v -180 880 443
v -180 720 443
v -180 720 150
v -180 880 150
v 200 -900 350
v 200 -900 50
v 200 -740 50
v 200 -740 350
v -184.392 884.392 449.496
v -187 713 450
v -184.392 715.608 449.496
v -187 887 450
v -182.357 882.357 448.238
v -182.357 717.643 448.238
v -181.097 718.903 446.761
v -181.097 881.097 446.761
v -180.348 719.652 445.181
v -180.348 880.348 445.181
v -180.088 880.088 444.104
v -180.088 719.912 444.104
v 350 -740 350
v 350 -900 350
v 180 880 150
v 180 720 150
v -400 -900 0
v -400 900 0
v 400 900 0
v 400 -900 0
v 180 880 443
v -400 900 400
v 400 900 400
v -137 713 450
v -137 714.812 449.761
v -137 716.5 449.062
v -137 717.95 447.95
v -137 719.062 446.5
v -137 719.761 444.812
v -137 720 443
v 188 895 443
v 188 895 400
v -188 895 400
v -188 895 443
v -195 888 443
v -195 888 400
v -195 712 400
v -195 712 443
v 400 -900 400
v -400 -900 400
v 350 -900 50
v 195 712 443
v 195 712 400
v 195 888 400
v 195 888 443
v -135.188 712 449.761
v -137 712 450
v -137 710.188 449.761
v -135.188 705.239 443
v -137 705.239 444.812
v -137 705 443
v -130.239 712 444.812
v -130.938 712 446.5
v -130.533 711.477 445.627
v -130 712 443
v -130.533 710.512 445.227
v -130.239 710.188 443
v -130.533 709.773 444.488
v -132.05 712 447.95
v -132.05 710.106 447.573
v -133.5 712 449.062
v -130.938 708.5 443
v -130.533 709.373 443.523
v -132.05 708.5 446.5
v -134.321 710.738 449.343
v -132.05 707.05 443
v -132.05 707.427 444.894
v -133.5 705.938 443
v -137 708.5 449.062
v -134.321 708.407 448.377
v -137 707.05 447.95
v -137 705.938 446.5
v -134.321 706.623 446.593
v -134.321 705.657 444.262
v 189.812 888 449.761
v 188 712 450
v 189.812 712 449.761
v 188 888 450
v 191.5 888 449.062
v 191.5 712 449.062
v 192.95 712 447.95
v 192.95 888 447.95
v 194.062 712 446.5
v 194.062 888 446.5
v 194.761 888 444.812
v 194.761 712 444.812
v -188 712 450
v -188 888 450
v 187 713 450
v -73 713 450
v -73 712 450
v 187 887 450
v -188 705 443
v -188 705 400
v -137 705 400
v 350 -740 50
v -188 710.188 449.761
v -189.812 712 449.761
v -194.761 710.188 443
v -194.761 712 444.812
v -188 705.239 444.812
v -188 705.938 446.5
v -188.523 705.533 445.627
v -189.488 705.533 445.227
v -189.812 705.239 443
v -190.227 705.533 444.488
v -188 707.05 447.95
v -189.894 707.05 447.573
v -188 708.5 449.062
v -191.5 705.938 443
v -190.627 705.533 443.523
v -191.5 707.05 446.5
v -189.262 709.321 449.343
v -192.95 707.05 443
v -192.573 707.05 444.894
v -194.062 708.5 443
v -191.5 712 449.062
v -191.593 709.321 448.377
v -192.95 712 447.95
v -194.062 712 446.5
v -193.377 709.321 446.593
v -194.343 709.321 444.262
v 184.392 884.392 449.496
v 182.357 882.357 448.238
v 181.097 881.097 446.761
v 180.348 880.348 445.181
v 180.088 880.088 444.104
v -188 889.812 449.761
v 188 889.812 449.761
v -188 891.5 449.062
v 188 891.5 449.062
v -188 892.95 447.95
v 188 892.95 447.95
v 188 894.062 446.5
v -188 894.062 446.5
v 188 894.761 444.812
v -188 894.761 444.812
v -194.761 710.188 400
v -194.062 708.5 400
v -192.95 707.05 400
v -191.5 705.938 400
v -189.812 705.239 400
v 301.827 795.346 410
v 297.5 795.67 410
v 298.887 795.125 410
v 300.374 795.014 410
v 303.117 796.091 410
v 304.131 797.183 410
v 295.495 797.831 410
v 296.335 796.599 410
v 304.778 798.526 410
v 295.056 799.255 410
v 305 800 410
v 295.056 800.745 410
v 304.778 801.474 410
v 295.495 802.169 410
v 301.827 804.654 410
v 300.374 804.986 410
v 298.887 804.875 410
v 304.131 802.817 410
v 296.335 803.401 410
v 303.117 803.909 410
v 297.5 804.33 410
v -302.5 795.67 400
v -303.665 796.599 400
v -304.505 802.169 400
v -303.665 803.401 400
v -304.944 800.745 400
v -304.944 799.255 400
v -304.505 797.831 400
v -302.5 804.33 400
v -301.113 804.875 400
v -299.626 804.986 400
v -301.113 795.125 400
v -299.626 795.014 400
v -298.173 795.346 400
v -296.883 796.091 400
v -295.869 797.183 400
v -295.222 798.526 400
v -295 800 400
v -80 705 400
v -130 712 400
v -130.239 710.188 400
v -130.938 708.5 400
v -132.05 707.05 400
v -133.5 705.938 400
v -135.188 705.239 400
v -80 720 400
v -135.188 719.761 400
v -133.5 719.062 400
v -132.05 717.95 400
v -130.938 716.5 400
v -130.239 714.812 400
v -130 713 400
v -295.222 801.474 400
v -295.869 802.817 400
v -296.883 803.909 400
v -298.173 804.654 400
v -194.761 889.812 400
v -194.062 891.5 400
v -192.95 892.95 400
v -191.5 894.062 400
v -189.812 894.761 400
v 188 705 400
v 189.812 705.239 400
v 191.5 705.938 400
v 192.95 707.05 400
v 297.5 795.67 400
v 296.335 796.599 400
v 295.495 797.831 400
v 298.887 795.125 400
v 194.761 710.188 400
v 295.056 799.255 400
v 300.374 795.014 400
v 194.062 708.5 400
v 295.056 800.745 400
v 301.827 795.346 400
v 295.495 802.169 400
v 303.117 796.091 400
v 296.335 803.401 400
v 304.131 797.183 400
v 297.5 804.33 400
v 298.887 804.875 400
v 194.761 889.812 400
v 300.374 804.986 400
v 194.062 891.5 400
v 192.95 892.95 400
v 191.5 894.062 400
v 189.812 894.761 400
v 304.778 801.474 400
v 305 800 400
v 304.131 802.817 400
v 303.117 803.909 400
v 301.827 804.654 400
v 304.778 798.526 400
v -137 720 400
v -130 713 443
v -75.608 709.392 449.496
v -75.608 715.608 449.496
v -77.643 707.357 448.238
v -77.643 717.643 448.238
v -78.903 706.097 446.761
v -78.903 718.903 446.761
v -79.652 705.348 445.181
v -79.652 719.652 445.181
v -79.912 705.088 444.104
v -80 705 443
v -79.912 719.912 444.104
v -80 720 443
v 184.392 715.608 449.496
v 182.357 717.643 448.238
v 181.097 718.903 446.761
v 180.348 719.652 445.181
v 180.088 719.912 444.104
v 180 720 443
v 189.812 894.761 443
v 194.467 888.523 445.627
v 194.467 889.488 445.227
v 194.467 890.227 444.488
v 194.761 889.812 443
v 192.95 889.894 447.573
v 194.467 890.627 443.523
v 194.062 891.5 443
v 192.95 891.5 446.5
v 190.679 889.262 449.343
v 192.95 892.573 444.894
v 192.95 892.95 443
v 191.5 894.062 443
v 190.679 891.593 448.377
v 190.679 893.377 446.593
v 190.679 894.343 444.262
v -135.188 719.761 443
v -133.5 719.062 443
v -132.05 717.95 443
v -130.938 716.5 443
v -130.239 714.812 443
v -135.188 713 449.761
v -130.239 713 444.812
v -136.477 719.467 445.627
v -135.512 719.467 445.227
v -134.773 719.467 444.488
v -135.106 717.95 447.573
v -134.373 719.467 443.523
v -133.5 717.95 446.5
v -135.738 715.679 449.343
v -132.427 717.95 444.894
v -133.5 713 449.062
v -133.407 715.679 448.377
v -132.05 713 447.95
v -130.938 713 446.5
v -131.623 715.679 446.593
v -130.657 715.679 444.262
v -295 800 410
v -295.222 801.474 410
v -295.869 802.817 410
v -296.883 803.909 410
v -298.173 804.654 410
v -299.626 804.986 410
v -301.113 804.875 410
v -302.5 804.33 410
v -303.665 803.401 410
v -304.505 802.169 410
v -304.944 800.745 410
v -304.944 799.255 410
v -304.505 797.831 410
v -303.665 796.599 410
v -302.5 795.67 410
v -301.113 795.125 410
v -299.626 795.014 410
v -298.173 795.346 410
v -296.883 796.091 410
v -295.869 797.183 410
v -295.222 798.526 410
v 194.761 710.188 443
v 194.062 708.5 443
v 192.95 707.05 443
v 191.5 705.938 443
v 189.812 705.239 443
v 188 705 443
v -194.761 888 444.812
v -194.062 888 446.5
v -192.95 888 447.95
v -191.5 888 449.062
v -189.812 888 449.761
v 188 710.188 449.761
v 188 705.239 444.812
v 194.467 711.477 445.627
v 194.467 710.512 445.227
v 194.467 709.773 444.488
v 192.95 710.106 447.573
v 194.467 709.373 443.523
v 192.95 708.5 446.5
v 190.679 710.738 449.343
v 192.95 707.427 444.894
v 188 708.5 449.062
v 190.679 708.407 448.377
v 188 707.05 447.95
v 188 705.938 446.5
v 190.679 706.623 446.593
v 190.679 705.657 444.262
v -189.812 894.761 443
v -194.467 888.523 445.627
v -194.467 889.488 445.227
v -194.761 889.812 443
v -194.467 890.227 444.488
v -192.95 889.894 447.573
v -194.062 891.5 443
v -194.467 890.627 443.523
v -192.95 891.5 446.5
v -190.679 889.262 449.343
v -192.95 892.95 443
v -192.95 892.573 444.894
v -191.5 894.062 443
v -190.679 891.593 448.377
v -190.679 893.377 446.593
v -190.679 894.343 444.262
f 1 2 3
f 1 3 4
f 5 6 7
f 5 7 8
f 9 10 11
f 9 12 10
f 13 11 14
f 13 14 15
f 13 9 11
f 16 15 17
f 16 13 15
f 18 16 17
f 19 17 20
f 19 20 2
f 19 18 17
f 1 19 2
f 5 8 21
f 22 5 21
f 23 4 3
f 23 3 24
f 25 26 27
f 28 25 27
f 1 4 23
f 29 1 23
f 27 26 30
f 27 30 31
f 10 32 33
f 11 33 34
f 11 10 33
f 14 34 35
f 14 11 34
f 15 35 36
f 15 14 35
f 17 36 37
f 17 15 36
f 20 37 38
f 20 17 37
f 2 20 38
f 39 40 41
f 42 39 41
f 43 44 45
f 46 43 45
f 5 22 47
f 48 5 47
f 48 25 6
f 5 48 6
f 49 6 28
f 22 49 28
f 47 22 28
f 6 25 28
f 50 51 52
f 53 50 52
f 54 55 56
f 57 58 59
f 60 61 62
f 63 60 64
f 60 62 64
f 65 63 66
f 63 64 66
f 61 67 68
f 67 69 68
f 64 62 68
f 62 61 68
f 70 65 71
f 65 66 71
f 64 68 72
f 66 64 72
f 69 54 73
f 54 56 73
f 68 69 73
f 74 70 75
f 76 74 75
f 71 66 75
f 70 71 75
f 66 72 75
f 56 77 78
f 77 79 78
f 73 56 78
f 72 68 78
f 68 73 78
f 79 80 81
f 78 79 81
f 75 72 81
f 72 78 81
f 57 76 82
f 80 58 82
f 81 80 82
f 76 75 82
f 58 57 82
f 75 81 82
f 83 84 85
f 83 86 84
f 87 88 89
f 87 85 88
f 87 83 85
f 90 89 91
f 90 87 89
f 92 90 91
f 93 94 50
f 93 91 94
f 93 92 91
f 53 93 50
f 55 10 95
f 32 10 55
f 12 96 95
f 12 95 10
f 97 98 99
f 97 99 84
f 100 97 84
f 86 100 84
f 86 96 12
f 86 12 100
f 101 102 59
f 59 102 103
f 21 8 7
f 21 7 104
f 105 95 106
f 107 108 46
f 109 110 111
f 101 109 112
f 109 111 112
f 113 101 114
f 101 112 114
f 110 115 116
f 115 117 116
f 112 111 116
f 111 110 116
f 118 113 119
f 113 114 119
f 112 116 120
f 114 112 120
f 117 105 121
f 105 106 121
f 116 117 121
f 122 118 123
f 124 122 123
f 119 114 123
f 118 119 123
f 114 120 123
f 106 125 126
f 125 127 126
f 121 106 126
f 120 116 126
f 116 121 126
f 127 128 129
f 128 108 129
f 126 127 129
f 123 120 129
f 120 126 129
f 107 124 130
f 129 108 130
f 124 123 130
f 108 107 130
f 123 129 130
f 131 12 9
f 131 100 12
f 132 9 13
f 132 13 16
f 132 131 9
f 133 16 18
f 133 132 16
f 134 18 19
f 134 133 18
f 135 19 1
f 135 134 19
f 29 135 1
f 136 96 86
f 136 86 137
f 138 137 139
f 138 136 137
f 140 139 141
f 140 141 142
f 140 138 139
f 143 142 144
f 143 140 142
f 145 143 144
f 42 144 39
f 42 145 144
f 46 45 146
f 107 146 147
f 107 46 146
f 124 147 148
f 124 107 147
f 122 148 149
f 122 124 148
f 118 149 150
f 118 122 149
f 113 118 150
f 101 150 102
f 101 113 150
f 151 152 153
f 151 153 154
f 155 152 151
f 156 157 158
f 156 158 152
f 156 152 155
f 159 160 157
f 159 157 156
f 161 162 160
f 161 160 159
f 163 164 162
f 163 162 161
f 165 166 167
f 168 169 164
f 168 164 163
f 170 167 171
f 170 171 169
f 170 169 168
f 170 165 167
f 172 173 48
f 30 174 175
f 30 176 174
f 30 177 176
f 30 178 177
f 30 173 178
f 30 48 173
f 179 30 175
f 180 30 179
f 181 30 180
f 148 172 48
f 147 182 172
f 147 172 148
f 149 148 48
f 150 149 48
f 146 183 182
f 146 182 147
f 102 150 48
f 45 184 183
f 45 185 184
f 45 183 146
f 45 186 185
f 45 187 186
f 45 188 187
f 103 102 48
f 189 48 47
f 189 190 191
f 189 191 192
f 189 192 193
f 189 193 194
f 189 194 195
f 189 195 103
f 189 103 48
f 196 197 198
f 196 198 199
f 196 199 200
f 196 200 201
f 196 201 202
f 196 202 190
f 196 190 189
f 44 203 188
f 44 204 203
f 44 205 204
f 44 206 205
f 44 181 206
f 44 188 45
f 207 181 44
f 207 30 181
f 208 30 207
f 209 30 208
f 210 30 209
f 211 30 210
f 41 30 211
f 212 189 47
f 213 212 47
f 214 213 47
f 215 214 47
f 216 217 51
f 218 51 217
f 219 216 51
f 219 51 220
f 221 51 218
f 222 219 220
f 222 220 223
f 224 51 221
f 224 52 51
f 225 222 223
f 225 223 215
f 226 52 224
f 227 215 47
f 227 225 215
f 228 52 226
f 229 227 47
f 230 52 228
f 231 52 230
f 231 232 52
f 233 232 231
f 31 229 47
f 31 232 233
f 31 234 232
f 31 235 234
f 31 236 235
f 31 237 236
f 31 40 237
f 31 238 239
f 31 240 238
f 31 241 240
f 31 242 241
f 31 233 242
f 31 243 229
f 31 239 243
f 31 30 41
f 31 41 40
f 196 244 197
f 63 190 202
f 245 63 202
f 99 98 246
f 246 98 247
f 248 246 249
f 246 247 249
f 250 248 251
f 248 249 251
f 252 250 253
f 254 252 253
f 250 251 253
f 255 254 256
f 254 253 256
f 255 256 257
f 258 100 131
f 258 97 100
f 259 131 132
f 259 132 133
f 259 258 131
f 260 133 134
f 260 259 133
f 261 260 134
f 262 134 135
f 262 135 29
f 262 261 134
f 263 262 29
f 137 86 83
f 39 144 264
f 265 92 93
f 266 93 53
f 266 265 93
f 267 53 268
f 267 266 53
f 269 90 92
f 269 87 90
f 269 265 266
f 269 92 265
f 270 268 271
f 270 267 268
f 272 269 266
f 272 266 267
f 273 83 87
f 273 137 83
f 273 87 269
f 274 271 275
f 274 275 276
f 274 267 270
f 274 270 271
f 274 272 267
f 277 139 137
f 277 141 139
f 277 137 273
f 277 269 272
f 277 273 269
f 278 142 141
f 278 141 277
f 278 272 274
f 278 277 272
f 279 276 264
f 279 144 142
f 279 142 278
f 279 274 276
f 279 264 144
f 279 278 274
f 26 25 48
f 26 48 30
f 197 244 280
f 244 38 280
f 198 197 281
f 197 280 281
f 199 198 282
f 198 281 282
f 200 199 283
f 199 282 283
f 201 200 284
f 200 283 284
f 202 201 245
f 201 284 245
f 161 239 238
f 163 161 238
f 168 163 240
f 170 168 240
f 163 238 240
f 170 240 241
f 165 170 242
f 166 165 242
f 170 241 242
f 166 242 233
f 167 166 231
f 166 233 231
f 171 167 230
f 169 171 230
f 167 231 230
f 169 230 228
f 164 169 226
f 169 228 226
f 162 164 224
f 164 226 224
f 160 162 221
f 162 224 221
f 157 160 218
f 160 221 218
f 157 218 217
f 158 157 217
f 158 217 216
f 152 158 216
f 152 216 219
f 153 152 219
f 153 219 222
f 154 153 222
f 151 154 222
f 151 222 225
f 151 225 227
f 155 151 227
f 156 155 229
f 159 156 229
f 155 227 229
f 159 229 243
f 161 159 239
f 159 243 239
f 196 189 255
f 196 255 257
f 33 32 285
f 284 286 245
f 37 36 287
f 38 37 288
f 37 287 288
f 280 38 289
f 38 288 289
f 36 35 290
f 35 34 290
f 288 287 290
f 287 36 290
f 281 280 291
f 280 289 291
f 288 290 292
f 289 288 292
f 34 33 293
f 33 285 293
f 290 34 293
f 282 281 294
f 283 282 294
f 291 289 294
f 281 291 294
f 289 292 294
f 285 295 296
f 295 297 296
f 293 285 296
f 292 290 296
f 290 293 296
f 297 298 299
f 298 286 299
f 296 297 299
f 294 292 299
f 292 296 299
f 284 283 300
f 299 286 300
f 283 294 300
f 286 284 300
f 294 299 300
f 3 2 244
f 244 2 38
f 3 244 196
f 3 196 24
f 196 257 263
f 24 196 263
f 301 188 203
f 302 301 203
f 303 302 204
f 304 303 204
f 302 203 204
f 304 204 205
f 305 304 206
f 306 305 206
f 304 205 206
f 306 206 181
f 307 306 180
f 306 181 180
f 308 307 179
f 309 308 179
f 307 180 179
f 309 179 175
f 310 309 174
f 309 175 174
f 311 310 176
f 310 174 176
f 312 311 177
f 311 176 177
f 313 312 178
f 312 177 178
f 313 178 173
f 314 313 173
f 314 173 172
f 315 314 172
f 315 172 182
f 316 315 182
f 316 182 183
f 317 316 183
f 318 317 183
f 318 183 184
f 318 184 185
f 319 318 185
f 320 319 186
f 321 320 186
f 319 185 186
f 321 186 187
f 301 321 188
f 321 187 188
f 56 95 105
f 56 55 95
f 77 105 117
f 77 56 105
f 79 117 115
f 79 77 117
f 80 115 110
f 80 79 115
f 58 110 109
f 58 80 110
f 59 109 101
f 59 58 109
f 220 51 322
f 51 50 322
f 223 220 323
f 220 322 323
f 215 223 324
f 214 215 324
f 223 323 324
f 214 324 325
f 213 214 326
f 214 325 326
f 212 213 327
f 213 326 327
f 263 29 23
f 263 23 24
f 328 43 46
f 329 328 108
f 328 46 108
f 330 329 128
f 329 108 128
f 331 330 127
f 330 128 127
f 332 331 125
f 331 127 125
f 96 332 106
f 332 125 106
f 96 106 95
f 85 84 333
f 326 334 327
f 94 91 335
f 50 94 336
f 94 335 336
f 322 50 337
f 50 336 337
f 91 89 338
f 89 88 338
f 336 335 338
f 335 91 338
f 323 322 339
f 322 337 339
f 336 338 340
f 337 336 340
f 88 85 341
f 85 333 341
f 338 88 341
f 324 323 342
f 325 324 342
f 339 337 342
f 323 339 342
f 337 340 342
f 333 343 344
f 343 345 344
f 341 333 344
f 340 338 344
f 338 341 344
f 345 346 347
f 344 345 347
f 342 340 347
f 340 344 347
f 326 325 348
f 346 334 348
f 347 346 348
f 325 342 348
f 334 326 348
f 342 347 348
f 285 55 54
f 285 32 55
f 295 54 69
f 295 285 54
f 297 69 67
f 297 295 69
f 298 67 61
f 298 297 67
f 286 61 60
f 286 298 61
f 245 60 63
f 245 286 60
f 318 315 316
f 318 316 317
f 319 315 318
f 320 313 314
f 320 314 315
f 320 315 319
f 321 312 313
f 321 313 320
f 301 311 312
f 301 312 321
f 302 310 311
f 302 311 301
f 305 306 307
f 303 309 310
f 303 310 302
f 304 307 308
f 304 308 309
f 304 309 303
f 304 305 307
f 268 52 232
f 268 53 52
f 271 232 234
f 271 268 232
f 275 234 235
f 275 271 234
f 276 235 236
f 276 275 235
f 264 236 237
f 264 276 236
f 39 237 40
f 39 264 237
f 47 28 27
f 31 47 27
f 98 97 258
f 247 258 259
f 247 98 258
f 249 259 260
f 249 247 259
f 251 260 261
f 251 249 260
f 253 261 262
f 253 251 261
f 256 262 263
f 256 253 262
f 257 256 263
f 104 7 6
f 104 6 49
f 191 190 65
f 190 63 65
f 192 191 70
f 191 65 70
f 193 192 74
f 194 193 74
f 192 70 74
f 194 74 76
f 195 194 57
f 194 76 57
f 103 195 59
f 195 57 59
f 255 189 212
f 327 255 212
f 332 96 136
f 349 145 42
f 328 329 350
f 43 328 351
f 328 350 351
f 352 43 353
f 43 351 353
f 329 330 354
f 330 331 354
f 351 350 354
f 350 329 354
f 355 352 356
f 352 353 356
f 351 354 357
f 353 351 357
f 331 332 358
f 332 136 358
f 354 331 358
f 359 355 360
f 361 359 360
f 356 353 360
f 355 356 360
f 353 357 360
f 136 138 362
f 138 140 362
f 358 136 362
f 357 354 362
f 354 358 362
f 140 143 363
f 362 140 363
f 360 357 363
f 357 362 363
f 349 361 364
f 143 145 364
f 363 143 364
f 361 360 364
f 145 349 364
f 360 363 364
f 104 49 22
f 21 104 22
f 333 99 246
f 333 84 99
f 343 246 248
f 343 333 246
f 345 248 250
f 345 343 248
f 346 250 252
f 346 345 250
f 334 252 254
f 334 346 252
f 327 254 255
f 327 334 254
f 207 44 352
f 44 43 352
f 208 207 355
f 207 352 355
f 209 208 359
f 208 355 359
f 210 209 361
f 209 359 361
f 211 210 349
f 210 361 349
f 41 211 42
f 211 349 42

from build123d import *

# Parameters (mm, degrees)
F0_W     = 800
F0_H     = 1800
F1_DEPTH = 400
F2_W     = 180
F2_H     = 160
F3_DEPTH = 250
F2_W_2   = 80
F2_H_2   = 15
F4_DEPTH = 50
F5_R     = 7
F2_R     = 5
F6_DEPTH = 10
F7_W     = 150
F7_H     = 300
F8_DEPTH = 160


with BuildPart() as f1:
    # F0 (on Top) → F1 (new body)
    with BuildSketch(Plane.XY):
        Rectangle(F0_W, F0_H)
    extrude(amount=F1_DEPTH)

    # F2 (on face) → F3 (cut)
    with BuildSketch(Plane.XY.offset(400)):
        Polygon((0, 720), (0, 880), (-180, 880), (-180, 720), (-130, 720), (-80, 720), align=None)
        with Locations((90, 800)):
            Rectangle(F2_W, F2_H)
    extrude(amount=-F3_DEPTH, mode=Mode.SUBTRACT)

    # F2 (on face) → F4 (join)
    with BuildSketch(Plane.XY.offset(400)):
        Polygon((0, 880), (0, 895), (-195, 895), (-195, 705), (-130, 705), (-130, 720), (-180, 720), (-180, 880), align=None)
        Polygon((195, 895), (0, 895), (0, 880), (180, 880), (180, 720), (0, 720), (0, 705), (195, 705), align=None)
        with Locations((-40, 712.5)):
            Rectangle(F2_W_2, F2_H_2)
    extrude(amount=F4_DEPTH)

    # F5
    f5_edges = [f1.edges().sort_by_distance(p)[0] for p in [
        (0, 895, 450),
        (-195, 800, 450),
        (-162.5, 705, 450),
        (-130, 712.5, 450),
        (-155, 720, 450),
        (-180, 800, 450),
        (0, 880, 450),
        (180, 800, 450),
        (50, 720, 450),
        (-80, 712.5, 450),
        (57.5, 705, 450),
        (195, 800, 450),
        (-130, 705, 425),
        (-130, 720, 425),
        (-195, 705, 425),
        (195, 705, 425),
        (195, 895, 425),
        (-195, 895, 425),
    ]]
    fillet(f5_edges, radius=F5_R)

    # F2 (on face) → F6 (join)
    with BuildSketch(Plane.XY.offset(400)):
        with Locations((-300, 800)):
            Circle(F2_R)
        with Locations((300, 800)):
            Circle(F2_R)
    extrude(amount=F6_DEPTH)

    # F7 (on face) → F8 (cut)
    with BuildSketch(Plane.XZ.offset(900)):
        with Locations((275, 200)):
            Rectangle(F7_W, F7_H)
    extrude(amount=-F8_DEPTH, mode=Mode.SUBTRACT)


solid = f1.part
